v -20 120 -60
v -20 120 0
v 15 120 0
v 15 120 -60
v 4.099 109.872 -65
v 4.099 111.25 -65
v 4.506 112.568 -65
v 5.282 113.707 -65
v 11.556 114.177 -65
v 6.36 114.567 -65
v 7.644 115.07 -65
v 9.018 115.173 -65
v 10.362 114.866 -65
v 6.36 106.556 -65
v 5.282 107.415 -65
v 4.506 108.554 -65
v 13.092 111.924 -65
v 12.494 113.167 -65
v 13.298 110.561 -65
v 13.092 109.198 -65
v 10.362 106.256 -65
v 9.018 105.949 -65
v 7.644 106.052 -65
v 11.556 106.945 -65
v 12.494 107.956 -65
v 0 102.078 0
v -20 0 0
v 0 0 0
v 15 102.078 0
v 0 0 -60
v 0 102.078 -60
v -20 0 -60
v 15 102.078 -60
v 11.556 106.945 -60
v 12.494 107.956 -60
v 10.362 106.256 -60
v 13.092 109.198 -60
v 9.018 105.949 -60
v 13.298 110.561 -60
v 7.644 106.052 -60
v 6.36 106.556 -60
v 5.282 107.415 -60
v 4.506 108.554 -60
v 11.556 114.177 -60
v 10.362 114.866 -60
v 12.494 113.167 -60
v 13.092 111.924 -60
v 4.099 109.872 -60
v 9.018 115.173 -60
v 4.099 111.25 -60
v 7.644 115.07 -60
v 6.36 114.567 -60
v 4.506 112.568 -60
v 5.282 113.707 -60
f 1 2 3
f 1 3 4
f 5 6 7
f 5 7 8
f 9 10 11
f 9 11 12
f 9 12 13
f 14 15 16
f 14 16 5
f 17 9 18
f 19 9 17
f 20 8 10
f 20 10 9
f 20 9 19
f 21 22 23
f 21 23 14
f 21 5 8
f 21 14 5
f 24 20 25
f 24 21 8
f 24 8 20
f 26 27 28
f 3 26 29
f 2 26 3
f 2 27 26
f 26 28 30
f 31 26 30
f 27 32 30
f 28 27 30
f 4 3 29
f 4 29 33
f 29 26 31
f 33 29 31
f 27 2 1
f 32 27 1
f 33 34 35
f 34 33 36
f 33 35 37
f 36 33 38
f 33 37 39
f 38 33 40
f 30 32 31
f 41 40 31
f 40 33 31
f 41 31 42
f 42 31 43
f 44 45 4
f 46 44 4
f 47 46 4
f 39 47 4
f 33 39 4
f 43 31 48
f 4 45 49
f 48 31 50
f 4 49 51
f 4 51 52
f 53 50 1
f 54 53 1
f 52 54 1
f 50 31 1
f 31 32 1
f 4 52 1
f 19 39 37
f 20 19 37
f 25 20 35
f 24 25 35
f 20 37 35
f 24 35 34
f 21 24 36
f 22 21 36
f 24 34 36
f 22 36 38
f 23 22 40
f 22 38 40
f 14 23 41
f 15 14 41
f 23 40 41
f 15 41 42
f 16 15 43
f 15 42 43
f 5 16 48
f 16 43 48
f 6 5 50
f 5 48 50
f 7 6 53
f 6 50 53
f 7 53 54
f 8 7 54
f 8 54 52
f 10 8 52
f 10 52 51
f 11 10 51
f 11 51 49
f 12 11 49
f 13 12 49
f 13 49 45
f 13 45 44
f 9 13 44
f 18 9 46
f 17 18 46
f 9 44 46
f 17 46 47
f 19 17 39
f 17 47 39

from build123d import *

# Parameters (mm, degrees)
SKETCH1_W           = 20
SKETCH1_H           = 60
BOSS_EXTRUDE1_DEPTH = 120
SKETCH2_W           = 60
SKETCH2_H           = 17.921787448
BOSS_EXTRUDE2_DEPTH = 15
SKETCH3_R           = 4.625
BOSS_EXTRUDE3_DEPTH = 5


with BuildPart() as part:
    # Sketch1 → Boss-Extrude1 (new body)
    with BuildSketch(Plane(origin=(0, 0, 0), x_dir=(1, 0, 0), z_dir=(0, 1, 0))):
        with Locations((-10, 30)):
            Rectangle(SKETCH1_W, SKETCH1_H)
    extrude(amount=BOSS_EXTRUDE1_DEPTH)

    # Sketch2 → Boss-Extrude2 (add)
    with BuildSketch(Plane(origin=(0, 0, 0), x_dir=(0, 0, -1), z_dir=(1, 0, 0))):
        with Locations((30, 111.039106276)):
            Rectangle(SKETCH2_W, SKETCH2_H)
    extrude(amount=BOSS_EXTRUDE2_DEPTH)

    # Sketch3 → Boss-Extrude3 (add)
    with BuildSketch(Plane(origin=(0, 0, -60), x_dir=(-1, 0, 0), z_dir=(0, 0, -1))):
        with Locations(Location((-8.672680841, 110.56115287, 0), (0, 0, 180))):
            Circle(SKETCH3_R)
    extrude(amount=BOSS_EXTRUDE3_DEPTH)


solid = part.part
